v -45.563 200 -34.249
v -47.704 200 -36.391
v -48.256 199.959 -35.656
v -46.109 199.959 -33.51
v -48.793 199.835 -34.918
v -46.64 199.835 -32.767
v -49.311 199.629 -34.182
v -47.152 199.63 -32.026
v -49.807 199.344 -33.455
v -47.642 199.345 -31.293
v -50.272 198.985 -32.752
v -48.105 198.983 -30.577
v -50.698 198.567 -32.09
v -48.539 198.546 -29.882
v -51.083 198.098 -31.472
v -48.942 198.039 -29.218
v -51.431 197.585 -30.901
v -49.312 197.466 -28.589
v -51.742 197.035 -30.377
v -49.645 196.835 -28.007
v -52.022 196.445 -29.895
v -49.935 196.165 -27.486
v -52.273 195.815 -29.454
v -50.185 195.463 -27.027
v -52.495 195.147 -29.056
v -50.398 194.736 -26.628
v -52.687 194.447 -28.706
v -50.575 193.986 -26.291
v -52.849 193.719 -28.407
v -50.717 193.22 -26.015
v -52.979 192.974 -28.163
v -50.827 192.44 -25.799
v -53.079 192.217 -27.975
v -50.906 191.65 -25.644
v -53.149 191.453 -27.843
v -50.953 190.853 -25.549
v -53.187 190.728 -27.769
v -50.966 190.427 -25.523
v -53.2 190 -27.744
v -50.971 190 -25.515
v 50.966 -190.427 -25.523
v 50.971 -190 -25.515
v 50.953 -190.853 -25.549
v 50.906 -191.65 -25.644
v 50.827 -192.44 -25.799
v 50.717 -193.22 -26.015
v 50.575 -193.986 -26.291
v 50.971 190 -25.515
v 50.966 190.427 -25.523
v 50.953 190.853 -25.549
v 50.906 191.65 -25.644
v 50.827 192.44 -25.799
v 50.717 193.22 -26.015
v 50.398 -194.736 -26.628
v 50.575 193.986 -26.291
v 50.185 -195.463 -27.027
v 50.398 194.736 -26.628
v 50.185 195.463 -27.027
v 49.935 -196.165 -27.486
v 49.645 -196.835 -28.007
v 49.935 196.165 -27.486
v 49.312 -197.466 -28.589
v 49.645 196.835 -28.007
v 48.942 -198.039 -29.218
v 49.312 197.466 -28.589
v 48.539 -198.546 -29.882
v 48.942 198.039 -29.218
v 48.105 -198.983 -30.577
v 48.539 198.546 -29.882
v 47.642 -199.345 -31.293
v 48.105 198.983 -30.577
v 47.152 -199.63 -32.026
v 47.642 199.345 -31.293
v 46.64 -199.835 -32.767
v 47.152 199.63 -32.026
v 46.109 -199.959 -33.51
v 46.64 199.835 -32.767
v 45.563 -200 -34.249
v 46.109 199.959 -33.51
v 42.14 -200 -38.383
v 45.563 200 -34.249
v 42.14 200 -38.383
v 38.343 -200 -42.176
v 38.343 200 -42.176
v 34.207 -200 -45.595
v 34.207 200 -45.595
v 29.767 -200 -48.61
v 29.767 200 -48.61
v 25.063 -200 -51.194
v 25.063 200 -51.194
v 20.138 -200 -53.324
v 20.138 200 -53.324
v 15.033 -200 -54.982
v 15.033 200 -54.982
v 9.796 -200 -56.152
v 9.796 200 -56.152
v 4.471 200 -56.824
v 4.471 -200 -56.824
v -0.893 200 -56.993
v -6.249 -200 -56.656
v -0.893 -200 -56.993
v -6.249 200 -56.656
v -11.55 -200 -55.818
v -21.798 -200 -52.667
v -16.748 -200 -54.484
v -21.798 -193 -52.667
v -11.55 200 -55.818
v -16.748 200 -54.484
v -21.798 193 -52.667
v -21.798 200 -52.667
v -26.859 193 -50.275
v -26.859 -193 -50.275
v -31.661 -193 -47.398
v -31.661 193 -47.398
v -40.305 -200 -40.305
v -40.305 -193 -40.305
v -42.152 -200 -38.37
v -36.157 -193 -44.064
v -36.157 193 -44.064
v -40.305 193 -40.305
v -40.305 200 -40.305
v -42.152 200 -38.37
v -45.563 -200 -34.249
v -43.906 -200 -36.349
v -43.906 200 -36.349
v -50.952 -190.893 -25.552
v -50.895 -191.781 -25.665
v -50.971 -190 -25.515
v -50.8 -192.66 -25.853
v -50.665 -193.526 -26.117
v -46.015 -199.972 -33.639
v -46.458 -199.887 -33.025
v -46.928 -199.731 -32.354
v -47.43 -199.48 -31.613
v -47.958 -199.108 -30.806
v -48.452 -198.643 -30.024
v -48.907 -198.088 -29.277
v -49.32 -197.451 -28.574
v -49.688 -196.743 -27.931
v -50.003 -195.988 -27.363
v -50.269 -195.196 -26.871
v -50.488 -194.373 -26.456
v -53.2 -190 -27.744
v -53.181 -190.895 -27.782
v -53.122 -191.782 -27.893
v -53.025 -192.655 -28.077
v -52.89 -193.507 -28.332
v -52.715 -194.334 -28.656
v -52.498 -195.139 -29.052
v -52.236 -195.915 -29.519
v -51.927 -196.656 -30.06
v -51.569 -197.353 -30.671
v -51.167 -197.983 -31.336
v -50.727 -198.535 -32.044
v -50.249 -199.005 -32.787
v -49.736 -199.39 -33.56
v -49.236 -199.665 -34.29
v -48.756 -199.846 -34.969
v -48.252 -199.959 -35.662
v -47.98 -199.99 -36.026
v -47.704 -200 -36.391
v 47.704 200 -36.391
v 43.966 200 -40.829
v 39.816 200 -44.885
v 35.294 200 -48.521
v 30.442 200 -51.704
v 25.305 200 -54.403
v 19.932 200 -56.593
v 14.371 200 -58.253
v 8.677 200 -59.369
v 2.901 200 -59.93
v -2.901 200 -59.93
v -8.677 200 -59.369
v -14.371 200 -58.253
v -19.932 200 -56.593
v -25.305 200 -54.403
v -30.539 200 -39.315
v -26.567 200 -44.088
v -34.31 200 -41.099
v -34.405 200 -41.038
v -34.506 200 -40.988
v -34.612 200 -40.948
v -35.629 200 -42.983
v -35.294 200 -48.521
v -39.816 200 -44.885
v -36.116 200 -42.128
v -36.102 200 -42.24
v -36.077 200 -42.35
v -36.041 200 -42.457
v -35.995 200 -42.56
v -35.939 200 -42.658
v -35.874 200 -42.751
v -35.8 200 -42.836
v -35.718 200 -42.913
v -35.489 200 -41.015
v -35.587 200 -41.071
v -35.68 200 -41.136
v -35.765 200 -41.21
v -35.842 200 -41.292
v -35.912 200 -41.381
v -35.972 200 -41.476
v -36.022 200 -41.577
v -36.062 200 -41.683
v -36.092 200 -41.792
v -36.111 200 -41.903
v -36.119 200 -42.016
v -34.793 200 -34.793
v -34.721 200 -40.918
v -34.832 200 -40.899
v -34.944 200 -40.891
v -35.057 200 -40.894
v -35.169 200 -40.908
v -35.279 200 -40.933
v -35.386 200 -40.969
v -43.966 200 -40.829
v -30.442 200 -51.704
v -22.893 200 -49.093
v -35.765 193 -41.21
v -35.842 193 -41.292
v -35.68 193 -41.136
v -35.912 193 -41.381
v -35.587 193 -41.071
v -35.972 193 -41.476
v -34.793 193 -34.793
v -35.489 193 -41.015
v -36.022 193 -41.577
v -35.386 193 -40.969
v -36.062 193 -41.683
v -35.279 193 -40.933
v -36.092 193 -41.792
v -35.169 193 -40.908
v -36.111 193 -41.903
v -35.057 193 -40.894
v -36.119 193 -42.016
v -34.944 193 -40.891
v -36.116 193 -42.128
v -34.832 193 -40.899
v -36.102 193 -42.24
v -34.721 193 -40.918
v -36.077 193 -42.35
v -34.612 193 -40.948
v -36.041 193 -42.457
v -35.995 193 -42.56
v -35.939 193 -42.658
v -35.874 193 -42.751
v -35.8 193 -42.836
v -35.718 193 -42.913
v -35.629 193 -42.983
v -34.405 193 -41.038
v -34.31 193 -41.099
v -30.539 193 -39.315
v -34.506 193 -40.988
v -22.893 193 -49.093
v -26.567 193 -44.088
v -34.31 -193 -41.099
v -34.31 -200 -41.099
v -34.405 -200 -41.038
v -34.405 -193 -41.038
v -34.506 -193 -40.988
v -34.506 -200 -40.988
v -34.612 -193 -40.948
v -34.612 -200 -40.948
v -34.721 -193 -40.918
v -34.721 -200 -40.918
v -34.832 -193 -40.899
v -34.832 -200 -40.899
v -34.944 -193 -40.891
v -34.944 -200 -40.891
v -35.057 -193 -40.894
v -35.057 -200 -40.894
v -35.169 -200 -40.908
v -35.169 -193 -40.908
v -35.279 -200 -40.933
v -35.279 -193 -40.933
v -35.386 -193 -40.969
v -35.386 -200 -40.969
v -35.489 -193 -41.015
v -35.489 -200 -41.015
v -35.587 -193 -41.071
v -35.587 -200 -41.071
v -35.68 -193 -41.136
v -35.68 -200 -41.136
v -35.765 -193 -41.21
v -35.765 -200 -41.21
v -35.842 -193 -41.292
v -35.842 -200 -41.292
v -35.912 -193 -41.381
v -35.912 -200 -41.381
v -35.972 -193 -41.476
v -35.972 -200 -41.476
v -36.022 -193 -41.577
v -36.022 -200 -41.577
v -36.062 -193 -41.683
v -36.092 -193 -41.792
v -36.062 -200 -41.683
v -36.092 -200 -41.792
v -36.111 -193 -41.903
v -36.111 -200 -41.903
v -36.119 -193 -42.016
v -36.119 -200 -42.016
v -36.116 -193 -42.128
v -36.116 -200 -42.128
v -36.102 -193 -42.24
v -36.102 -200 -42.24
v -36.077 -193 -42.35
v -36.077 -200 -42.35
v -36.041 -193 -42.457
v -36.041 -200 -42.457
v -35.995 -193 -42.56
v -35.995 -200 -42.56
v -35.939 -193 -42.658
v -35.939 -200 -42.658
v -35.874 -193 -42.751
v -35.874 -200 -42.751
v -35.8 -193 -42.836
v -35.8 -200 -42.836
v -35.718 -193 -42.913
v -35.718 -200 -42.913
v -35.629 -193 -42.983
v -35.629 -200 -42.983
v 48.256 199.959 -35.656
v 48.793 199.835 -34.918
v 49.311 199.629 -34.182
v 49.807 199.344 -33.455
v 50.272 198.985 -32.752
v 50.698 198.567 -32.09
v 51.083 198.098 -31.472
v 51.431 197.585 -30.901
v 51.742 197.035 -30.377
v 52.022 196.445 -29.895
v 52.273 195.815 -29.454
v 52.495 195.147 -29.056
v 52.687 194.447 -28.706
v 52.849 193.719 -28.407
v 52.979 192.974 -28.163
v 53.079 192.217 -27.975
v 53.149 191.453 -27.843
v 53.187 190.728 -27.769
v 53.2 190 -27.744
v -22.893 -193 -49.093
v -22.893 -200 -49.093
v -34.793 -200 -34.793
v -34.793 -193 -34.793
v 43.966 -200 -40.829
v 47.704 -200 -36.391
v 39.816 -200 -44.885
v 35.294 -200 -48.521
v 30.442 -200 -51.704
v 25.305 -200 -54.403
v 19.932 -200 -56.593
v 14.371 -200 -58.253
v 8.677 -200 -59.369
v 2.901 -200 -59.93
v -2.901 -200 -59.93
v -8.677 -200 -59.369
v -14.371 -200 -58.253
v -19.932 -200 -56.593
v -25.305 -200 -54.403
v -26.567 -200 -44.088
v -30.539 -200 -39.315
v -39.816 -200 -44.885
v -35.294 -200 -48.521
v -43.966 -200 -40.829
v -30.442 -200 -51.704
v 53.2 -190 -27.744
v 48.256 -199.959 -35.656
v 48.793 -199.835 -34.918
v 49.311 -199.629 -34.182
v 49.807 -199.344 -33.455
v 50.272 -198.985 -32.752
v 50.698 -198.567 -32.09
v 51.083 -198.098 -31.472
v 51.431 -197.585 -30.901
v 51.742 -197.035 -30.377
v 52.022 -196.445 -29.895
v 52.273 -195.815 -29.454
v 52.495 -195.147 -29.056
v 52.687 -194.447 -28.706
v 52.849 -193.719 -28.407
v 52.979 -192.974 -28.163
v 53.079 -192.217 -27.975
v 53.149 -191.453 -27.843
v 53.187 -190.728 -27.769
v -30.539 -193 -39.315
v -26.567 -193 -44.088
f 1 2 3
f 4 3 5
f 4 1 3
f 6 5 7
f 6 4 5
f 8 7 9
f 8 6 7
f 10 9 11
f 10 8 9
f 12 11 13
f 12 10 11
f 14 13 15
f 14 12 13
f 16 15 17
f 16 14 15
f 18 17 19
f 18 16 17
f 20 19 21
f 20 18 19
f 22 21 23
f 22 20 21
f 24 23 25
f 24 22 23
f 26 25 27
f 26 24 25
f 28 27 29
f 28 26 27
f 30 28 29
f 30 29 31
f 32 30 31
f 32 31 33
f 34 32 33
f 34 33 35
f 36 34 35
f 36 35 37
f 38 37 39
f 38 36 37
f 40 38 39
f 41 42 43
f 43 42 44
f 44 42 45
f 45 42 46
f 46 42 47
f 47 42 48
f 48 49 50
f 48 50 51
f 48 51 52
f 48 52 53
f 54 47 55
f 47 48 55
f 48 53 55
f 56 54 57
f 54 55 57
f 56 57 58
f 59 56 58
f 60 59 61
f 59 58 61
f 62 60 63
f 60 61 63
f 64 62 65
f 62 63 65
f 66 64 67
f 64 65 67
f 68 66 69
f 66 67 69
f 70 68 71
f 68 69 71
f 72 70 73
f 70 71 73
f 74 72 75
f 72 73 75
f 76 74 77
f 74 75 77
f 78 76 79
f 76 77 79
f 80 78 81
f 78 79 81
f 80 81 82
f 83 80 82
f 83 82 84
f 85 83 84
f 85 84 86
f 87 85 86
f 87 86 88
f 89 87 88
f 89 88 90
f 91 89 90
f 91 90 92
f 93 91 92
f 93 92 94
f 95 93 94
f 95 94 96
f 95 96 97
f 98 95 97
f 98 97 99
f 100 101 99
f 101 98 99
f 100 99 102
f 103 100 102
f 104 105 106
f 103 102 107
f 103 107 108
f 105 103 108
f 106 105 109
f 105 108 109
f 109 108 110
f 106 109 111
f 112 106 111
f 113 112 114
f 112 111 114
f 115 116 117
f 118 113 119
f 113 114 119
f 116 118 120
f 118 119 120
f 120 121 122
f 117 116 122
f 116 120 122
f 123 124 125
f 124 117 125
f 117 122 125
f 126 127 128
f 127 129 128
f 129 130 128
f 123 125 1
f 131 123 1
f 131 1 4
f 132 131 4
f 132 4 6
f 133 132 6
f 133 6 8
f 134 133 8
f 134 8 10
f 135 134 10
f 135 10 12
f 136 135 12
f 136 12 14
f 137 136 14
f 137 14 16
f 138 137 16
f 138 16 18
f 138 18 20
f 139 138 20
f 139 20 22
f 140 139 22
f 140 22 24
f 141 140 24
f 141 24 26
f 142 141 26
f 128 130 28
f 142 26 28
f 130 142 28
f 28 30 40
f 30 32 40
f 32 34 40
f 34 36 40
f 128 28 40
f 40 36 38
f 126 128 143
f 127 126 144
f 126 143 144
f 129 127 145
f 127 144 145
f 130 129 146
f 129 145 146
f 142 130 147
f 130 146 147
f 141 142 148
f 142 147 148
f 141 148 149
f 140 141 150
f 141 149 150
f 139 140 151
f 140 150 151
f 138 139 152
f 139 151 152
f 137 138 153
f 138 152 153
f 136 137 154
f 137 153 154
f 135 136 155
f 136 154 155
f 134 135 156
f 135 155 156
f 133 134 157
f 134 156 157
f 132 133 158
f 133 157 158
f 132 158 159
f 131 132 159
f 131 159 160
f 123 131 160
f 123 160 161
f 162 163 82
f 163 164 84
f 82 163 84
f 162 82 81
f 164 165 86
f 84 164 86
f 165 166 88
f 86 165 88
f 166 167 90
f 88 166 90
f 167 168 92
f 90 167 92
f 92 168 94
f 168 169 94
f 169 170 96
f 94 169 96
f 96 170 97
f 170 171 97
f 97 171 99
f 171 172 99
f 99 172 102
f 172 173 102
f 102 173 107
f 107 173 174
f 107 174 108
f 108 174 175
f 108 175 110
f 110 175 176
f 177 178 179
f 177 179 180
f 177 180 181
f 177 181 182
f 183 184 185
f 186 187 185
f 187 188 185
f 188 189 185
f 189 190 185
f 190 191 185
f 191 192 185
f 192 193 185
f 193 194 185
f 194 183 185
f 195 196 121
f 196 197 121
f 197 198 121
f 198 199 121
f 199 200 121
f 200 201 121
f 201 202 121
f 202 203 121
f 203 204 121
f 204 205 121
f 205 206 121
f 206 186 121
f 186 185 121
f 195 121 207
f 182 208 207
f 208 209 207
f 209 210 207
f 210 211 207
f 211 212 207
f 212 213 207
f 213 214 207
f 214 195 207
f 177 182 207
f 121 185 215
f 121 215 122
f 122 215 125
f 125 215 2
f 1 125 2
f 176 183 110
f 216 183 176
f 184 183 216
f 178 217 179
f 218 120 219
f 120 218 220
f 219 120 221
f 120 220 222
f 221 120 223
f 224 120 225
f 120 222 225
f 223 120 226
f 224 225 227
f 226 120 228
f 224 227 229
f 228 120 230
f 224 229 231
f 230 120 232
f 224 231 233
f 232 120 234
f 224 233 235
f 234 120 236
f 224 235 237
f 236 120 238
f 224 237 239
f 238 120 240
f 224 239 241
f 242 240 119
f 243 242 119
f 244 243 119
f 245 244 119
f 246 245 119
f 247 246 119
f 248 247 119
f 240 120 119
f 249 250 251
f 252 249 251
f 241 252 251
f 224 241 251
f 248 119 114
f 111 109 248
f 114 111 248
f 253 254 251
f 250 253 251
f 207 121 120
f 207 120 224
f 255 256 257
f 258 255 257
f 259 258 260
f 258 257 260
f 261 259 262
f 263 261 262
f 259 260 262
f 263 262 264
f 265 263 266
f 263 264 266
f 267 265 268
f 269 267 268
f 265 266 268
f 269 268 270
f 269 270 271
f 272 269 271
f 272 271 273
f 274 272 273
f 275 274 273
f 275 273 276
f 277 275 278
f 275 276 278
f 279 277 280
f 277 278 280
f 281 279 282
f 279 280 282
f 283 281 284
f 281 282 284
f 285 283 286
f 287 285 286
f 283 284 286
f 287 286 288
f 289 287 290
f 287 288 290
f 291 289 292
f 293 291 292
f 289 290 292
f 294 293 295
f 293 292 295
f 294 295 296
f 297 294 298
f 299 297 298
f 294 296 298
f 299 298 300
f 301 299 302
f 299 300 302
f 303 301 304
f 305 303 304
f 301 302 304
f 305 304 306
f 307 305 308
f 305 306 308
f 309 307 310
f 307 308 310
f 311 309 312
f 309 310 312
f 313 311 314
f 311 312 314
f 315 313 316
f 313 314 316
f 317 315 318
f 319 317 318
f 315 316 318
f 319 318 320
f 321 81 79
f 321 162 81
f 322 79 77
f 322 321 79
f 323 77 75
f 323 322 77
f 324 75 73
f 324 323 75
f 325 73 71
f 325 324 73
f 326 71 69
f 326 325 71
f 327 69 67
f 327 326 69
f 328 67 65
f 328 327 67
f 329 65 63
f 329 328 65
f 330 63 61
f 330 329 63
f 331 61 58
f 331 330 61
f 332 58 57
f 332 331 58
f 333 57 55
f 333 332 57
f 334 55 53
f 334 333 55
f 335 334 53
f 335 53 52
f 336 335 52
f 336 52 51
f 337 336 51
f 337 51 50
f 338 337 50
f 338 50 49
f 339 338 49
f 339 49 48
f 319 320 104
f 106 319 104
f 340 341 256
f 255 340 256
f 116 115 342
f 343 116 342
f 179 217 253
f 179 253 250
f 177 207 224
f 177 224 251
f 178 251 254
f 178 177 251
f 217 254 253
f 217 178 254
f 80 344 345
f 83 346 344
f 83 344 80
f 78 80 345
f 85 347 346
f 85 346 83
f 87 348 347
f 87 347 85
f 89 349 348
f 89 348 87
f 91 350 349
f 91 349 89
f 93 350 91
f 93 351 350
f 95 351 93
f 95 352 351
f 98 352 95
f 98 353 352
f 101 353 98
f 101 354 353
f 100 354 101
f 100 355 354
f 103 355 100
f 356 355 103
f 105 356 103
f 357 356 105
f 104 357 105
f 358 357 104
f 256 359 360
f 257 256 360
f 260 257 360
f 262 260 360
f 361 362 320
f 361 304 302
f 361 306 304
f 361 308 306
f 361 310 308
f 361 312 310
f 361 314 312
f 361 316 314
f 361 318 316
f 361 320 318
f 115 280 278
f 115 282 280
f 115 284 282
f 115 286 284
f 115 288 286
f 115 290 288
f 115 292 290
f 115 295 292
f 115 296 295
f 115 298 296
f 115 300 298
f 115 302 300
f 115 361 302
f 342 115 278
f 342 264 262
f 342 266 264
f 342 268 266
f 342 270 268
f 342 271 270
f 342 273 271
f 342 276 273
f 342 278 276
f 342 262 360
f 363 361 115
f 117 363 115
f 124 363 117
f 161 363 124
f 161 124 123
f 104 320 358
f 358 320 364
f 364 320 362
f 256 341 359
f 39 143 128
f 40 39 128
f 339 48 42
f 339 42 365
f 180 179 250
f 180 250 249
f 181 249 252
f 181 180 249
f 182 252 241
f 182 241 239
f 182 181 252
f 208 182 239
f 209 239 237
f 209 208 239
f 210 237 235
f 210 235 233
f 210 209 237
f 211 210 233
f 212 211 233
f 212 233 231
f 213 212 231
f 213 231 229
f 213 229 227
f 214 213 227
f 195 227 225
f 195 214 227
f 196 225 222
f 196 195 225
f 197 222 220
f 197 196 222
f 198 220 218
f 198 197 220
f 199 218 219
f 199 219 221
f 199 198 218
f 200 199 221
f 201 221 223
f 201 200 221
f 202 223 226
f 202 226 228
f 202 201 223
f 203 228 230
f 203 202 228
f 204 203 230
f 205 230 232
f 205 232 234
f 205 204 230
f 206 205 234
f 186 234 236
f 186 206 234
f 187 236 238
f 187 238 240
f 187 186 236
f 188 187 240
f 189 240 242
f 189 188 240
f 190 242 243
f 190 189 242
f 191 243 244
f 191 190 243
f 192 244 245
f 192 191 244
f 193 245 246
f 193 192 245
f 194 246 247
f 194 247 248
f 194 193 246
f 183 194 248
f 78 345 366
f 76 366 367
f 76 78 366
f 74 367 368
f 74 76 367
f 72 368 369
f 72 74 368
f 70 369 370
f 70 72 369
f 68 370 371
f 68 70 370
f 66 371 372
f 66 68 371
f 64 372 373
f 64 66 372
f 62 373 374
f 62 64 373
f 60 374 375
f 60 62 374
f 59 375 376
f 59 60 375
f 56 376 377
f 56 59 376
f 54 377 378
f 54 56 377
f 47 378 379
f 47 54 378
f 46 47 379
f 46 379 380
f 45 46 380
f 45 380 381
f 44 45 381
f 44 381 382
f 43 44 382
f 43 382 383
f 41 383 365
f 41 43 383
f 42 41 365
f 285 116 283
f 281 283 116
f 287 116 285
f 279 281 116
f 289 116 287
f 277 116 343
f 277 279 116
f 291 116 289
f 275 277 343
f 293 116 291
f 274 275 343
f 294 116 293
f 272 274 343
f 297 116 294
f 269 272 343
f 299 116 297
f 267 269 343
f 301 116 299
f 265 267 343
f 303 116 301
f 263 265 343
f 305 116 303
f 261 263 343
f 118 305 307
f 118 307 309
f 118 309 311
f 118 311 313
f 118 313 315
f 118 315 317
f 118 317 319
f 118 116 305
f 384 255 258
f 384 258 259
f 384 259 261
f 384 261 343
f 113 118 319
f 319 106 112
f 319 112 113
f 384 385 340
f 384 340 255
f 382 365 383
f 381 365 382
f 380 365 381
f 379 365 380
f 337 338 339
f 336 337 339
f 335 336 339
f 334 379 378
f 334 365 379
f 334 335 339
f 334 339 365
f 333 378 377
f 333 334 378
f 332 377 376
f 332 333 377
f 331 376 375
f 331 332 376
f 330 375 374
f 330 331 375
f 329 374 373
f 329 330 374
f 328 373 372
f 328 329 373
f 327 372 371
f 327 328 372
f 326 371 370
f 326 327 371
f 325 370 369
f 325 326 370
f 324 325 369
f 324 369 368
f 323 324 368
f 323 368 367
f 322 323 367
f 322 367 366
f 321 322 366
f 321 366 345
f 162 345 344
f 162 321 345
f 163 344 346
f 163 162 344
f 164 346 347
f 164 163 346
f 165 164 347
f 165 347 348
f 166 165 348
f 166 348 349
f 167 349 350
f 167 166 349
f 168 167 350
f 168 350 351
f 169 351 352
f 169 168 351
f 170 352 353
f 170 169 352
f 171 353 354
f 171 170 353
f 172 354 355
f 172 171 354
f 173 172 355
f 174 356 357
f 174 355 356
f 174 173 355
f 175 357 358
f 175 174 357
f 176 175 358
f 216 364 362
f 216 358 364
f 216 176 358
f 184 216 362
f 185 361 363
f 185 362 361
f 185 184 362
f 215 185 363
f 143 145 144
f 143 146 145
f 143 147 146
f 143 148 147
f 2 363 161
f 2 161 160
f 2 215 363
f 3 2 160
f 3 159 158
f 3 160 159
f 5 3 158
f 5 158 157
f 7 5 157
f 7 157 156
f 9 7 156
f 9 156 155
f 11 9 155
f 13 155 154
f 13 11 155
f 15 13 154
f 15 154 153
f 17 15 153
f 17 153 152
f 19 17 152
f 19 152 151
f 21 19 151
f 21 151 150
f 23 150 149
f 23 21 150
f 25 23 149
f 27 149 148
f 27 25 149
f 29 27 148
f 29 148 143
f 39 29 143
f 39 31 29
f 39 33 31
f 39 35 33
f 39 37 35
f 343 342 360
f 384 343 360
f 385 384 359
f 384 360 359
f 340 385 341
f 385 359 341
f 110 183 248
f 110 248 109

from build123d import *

# Parameters (mm, degrees)
SKETCH1_W           = 3
SKETCH1_H           = 400
SKETCH6_OUTSIDE_W   = 208.902
SKETCH6_OUTSIDE_H   = 208.902
CUT_EXTRUDE2_DEPTH  = 409.900966005
BOSS_EXTRUDE4_DEPTH = 7
FILLET1_R           = 10


with BuildPart() as part:
    # Sketch1 → Revolve1 (revolve)
    with BuildSketch(Plane.XY, mode=Mode.PRIVATE) as revolve1_sk:
        with Locations((58.5, 0)):
            Rectangle(SKETCH1_W, SKETCH1_H)
    revolve(revolve1_sk.sketch.rotate(Axis((0, 0, 0), (0, 1, 0)), 90), axis=Axis((0, 0, 0), (0, 1, 0)))

    # Sketch6 outside → Cut-Extrude2 (cut, through all)
    with BuildSketch(Plane(origin=(0, 200, 0), x_dir=(1, 0, 0), z_dir=(0, 1, 0))):
        Rectangle(SKETCH6_OUTSIDE_W, SKETCH6_OUTSIDE_H)
        with BuildLine():
            Line((0, -25.455844123), (53.200134751, 27.744290628))
            ThreePointArc((53.200134751, 27.744290628), (0, 60), (-53.200134751, 27.744290628))
            Line((-53.200134751, 27.744290628), (0, -25.455844123))
        make_face(mode=Mode.SUBTRACT)
    extrude(amount=-CUT_EXTRUDE2_DEPTH, mode=Mode.SUBTRACT)

    # Sketch7 → Boss-Extrude4 (add)
    with BuildSketch(Plane(origin=(0, 200, 0), x_dir=(1, 0, 0), z_dir=(0, 1, 0))):
        with BuildLine():
            Line((-35.629141961, 42.982621722), (-21.797880868, 52.667375003))
            ThreePointArc((-21.797880868, 52.667375003), (-31.660719889, 47.398299717), (-40.305086528, 40.305086528))
            Line((-40.305086528, 40.305086528), (-34.793335026, 34.793335026))
            ThreePointArc((-34.793335026, 34.793335026), (-28.516275136, 41.671387576), (-22.892502884, 49.093130862))
            Line((-22.892502884, 49.093130862), (-34.309916158, 41.09857202))
            ThreePointArc((-34.309916158, 41.09857202), (-35.91155391, 41.380983969), (-35.629141961, 42.982621722))
        make_face()
    boss_extrude4 = extrude(amount=-BOSS_EXTRUDE4_DEPTH)

    # Mirror1: Boss-Extrude4 across plane
    add(boss_extrude4.mirror(Plane.ZX))

    # Fillet1
    fillet1_edges = [part.edges().sort_by_distance(p)[0] for p in [
        (52.085351582, 200, -26.629507459),
        (-52.085351582, -200, -26.629507459),
        (52.085351582, -200, -26.629507459),
        (-52.085351582, 200, -26.629507459),
    ]]
    fillet(fillet1_edges, radius=FILLET1_R)


solid = part.part
